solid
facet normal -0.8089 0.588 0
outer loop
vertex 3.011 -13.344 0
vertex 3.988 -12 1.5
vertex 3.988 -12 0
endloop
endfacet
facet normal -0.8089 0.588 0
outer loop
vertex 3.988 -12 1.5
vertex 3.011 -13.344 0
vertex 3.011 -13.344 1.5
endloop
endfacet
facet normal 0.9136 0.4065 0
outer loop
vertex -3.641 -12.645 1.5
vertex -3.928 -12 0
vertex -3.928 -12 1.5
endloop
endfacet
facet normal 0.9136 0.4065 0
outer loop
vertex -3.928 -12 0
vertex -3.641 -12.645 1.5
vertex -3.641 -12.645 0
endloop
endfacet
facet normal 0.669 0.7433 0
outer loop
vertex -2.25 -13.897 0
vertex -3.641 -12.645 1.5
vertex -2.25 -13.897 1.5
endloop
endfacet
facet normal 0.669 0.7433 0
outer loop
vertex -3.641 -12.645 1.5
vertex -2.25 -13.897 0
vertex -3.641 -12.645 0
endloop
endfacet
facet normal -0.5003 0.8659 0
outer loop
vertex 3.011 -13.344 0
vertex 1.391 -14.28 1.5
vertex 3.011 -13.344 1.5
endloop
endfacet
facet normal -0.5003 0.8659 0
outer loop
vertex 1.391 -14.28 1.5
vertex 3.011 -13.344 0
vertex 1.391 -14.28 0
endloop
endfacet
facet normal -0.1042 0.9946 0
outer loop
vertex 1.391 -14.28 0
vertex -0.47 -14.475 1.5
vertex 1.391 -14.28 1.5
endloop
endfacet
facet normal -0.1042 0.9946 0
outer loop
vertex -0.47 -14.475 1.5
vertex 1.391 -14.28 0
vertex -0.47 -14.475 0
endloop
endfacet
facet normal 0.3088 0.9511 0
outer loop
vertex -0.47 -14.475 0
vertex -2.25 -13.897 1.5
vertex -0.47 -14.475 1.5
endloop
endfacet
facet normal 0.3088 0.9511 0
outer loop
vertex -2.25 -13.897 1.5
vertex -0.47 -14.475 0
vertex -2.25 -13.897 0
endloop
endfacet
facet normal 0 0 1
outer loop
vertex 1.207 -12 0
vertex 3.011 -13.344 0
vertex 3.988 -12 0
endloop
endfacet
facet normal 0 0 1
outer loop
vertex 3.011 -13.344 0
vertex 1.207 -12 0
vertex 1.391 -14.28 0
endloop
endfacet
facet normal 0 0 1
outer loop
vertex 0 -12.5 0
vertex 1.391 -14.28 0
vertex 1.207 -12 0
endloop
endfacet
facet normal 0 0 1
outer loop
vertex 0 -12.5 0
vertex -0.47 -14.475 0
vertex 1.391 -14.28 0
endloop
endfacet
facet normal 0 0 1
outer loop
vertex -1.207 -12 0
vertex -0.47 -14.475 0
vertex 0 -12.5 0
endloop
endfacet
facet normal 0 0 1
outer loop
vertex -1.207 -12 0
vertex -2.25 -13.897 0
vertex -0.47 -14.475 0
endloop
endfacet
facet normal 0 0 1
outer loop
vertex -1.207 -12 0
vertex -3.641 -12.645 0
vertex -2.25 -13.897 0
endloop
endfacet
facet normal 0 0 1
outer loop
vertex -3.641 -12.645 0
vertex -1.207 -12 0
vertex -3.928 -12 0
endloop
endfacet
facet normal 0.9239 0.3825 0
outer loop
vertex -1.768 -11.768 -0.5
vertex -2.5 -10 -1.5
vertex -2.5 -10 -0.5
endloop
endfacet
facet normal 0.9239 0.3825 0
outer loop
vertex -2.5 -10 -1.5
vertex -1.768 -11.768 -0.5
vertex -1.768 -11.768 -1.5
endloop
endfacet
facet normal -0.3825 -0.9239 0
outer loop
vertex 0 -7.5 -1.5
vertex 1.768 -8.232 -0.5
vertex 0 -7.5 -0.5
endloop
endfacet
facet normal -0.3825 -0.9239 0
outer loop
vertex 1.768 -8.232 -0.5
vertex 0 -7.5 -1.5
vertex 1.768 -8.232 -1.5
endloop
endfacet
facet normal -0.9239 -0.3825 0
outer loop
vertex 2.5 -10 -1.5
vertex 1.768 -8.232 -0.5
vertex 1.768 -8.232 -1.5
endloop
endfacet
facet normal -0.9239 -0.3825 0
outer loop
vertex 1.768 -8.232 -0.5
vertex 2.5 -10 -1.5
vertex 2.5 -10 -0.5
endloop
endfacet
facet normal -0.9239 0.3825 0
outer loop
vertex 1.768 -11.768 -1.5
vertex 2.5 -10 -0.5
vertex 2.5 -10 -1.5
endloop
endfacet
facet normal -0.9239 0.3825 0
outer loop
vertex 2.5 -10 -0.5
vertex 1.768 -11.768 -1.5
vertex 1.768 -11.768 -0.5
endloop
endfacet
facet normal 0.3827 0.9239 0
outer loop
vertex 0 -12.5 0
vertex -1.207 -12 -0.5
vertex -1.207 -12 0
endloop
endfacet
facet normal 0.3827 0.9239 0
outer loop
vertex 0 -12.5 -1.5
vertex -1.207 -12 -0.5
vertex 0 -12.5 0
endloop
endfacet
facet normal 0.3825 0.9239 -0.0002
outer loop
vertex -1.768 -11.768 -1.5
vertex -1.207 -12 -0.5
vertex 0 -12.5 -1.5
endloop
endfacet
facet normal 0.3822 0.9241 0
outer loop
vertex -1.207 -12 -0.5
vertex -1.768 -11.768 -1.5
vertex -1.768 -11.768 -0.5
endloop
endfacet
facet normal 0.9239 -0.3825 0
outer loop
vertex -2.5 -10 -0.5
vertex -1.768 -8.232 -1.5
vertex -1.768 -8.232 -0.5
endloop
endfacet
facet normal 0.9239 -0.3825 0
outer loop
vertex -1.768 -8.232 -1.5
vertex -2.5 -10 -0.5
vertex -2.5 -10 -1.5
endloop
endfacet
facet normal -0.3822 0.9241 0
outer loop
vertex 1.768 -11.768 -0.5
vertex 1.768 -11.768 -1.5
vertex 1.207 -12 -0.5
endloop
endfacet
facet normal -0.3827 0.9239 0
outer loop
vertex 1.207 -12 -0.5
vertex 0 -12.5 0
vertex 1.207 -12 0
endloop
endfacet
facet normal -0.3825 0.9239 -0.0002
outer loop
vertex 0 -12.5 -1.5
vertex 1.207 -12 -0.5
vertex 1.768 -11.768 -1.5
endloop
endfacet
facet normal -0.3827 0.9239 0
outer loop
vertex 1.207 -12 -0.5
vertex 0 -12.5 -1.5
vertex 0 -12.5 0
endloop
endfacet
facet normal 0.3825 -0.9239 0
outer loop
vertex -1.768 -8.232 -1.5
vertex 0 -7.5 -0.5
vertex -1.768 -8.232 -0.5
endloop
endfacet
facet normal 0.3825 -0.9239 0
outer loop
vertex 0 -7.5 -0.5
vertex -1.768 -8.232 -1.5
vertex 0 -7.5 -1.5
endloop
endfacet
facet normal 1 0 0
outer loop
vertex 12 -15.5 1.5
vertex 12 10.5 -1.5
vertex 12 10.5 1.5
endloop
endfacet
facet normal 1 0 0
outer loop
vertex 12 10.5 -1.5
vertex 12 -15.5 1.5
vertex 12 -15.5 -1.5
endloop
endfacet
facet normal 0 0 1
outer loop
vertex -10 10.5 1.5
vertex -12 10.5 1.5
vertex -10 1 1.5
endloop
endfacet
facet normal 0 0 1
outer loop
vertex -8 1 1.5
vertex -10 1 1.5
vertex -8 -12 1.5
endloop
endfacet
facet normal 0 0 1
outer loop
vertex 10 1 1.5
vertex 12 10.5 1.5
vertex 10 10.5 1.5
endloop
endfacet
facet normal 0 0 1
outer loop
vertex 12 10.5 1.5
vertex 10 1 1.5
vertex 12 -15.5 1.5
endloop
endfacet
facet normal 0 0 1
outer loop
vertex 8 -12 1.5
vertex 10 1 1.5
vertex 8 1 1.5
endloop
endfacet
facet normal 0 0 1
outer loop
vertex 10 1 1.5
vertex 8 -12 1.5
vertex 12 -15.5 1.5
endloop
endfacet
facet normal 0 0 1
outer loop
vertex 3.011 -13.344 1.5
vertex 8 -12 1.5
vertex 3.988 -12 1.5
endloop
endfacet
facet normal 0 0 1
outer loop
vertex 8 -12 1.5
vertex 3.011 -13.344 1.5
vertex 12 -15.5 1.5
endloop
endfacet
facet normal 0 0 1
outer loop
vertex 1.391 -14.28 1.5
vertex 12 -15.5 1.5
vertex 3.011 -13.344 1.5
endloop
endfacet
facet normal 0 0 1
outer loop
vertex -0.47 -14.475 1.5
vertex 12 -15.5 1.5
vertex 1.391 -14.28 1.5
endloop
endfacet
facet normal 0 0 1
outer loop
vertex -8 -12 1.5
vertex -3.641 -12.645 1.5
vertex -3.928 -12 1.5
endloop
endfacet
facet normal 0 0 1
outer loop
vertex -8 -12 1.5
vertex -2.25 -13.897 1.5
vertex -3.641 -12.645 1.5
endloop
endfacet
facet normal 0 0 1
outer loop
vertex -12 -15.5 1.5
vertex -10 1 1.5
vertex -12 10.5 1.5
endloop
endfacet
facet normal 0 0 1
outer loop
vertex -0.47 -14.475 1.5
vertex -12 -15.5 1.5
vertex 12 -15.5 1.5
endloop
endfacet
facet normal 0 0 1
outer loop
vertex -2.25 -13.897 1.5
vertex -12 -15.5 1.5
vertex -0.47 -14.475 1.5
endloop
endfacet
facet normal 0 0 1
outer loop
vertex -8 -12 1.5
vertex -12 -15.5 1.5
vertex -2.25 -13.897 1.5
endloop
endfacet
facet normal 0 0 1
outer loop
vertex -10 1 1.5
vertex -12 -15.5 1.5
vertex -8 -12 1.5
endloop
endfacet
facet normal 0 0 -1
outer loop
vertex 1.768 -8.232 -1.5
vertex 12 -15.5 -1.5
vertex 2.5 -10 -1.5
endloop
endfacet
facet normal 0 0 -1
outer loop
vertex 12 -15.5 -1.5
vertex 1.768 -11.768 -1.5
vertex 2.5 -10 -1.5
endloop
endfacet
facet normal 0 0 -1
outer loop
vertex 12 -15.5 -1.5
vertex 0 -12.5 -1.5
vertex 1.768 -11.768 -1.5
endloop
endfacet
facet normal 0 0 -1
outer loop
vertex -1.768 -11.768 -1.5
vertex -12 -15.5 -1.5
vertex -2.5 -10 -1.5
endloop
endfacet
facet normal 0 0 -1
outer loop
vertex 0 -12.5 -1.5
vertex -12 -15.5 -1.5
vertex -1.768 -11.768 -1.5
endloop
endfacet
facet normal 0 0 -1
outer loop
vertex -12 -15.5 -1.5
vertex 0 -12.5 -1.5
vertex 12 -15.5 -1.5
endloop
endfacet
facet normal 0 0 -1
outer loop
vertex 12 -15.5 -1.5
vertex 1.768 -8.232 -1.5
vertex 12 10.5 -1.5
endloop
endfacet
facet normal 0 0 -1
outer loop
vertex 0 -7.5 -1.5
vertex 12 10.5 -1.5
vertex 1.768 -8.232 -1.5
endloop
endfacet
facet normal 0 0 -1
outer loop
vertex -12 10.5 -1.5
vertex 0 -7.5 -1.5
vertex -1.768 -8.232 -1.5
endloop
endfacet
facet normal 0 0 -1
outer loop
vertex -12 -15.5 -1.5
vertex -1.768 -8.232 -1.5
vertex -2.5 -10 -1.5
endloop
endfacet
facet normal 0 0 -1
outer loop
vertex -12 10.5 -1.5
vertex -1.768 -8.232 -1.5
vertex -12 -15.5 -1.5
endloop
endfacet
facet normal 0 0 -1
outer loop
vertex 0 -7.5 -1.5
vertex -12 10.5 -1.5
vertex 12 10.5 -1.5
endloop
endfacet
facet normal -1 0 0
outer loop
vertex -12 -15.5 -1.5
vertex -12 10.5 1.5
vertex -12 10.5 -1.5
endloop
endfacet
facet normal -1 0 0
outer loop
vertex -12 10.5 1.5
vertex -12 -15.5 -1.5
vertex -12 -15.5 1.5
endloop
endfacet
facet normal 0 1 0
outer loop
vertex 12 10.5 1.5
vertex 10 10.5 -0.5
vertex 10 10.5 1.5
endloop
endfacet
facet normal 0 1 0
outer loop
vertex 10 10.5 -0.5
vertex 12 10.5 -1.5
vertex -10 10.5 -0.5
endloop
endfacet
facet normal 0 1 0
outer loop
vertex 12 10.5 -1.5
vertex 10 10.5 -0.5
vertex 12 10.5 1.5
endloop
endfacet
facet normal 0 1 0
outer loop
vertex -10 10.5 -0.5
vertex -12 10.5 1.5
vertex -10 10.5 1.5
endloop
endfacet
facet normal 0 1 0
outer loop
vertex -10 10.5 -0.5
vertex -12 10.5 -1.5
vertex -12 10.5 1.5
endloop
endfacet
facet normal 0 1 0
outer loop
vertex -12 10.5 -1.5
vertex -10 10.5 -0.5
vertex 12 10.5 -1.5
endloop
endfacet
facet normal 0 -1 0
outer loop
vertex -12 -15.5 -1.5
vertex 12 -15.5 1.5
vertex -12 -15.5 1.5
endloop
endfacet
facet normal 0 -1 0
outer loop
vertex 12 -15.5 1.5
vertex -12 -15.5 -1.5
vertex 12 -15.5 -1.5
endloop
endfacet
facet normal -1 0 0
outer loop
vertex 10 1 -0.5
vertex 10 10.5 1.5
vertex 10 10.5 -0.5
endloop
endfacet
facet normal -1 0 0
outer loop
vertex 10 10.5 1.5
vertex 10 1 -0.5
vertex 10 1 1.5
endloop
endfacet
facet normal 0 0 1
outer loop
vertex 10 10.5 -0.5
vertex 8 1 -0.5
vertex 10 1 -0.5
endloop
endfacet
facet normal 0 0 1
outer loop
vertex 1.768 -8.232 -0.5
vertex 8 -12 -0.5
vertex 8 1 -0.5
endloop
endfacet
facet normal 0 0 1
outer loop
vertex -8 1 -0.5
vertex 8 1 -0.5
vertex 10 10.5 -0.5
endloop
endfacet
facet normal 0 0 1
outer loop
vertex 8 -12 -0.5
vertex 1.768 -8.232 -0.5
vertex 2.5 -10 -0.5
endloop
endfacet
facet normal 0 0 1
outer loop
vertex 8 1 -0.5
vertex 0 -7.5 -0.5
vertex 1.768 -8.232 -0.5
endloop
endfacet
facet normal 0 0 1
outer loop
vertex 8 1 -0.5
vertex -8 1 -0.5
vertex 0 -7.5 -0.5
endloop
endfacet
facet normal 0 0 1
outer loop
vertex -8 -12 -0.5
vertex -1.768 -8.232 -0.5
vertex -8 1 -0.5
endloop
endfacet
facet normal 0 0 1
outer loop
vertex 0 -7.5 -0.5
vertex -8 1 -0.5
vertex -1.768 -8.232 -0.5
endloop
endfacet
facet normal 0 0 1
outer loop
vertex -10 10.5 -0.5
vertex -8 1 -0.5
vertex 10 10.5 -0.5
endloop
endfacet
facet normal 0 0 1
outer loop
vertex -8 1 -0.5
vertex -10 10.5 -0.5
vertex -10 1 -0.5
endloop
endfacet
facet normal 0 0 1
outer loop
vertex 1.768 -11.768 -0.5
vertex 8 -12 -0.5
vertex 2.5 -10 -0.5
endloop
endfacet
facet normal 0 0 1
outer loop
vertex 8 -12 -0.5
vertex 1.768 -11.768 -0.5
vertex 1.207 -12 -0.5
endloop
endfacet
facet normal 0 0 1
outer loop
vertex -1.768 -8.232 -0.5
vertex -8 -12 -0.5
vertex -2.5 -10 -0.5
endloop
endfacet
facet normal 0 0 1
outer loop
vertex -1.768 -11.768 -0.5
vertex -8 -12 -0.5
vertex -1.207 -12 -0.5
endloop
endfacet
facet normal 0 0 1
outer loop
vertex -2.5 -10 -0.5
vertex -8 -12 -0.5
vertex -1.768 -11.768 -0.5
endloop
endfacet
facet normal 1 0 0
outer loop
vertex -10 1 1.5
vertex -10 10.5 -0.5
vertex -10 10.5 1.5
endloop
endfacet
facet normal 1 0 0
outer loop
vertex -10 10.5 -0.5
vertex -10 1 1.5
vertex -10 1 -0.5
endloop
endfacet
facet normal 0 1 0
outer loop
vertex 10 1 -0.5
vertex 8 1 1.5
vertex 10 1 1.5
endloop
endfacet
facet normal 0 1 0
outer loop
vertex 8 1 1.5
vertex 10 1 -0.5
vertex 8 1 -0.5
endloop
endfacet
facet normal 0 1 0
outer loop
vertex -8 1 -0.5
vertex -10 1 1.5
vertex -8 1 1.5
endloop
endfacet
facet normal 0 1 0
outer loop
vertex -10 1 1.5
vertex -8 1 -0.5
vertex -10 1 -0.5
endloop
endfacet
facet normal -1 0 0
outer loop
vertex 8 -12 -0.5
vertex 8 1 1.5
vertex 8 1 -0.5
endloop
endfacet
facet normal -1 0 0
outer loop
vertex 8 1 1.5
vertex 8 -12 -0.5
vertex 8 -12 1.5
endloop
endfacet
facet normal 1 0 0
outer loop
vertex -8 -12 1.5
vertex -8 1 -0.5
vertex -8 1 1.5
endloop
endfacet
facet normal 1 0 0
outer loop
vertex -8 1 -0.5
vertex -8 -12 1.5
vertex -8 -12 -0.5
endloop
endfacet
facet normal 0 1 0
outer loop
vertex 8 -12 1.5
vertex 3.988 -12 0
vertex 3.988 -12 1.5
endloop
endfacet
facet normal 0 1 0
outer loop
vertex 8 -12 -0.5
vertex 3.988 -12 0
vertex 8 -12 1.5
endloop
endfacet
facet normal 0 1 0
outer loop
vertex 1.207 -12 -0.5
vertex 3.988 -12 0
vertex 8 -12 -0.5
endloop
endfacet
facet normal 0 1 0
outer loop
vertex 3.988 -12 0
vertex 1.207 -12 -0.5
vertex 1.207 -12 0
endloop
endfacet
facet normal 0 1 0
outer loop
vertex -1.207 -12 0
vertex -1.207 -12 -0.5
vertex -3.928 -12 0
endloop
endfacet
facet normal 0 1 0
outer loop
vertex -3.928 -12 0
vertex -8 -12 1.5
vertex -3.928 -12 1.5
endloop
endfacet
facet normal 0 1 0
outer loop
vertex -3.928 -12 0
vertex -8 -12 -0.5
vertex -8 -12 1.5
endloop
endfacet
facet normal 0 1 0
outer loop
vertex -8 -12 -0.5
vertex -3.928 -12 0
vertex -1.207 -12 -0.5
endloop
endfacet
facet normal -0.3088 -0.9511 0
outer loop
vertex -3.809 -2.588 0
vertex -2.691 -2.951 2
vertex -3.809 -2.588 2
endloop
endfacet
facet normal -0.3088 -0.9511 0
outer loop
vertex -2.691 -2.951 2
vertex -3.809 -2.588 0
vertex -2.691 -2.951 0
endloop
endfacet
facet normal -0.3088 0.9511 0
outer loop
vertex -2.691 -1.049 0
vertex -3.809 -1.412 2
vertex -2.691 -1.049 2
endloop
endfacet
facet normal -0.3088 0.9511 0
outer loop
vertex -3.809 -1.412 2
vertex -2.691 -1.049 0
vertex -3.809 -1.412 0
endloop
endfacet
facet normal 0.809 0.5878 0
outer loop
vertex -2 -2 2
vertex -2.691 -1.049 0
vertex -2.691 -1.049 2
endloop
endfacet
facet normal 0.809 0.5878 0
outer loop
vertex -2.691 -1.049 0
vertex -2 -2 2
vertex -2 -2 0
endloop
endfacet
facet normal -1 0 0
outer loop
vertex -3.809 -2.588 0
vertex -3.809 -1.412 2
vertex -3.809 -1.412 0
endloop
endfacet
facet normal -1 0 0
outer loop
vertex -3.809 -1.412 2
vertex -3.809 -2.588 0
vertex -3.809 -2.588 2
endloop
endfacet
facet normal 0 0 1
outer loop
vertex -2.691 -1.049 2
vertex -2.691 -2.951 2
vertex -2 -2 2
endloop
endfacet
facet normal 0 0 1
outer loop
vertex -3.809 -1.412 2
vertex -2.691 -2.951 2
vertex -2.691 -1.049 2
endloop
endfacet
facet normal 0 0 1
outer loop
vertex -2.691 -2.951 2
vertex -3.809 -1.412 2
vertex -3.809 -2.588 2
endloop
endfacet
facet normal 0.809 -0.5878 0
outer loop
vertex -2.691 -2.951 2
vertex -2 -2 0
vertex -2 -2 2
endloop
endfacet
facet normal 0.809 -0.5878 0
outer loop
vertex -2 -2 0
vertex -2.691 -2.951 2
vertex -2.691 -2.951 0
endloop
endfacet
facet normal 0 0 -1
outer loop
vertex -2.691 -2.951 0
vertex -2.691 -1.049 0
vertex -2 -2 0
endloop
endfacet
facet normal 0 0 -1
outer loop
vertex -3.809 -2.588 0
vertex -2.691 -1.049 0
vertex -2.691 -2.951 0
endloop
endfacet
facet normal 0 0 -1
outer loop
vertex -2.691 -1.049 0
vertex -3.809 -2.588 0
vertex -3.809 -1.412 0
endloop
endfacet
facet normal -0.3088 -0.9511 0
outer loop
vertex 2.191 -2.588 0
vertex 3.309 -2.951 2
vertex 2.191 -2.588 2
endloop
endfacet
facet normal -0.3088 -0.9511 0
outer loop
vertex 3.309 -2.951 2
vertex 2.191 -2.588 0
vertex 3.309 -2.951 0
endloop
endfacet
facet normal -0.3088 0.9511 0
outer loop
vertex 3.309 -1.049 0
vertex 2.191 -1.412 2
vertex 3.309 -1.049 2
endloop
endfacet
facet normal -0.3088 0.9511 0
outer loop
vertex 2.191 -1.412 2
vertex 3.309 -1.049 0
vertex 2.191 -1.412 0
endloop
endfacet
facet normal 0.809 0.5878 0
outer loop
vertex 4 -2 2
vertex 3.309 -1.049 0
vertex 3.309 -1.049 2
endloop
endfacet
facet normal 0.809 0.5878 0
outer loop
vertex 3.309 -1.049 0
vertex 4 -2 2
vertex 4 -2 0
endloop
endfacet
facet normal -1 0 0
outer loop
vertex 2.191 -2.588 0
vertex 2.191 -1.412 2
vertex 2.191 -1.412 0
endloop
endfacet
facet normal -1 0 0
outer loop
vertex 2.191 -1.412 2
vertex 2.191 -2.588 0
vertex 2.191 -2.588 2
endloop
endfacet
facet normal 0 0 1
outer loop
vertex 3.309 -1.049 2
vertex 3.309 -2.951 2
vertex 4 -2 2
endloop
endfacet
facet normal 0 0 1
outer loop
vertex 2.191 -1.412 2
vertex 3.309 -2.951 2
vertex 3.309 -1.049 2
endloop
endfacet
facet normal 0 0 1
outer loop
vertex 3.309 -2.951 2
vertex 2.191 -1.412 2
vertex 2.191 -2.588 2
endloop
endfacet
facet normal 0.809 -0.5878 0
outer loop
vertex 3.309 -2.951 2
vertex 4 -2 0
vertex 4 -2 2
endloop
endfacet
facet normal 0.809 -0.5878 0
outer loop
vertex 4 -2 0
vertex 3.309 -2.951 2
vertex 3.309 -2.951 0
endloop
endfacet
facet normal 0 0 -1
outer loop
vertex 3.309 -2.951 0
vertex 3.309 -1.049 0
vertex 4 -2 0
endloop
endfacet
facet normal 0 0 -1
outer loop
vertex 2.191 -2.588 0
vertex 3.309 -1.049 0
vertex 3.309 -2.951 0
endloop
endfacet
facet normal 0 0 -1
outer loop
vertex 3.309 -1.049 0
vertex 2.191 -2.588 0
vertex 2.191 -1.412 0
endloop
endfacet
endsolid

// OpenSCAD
union(){
difference(){
translate([0,-2.5,0])cube([24,26,3],true);
translate([0,6,2])cube([20,10,5],true);
translate([0,-2,2])cube([16,20,5],true);
translate([0,-10,0]){
cylinder(r=4.5,h=3);
cylinder(r=2.5,h=10,center=true);
}
}
translate([-3,-2,0])cylinder(r=1,h=2);
translate([3,-2,0])cylinder(r=1,h=2);
}
